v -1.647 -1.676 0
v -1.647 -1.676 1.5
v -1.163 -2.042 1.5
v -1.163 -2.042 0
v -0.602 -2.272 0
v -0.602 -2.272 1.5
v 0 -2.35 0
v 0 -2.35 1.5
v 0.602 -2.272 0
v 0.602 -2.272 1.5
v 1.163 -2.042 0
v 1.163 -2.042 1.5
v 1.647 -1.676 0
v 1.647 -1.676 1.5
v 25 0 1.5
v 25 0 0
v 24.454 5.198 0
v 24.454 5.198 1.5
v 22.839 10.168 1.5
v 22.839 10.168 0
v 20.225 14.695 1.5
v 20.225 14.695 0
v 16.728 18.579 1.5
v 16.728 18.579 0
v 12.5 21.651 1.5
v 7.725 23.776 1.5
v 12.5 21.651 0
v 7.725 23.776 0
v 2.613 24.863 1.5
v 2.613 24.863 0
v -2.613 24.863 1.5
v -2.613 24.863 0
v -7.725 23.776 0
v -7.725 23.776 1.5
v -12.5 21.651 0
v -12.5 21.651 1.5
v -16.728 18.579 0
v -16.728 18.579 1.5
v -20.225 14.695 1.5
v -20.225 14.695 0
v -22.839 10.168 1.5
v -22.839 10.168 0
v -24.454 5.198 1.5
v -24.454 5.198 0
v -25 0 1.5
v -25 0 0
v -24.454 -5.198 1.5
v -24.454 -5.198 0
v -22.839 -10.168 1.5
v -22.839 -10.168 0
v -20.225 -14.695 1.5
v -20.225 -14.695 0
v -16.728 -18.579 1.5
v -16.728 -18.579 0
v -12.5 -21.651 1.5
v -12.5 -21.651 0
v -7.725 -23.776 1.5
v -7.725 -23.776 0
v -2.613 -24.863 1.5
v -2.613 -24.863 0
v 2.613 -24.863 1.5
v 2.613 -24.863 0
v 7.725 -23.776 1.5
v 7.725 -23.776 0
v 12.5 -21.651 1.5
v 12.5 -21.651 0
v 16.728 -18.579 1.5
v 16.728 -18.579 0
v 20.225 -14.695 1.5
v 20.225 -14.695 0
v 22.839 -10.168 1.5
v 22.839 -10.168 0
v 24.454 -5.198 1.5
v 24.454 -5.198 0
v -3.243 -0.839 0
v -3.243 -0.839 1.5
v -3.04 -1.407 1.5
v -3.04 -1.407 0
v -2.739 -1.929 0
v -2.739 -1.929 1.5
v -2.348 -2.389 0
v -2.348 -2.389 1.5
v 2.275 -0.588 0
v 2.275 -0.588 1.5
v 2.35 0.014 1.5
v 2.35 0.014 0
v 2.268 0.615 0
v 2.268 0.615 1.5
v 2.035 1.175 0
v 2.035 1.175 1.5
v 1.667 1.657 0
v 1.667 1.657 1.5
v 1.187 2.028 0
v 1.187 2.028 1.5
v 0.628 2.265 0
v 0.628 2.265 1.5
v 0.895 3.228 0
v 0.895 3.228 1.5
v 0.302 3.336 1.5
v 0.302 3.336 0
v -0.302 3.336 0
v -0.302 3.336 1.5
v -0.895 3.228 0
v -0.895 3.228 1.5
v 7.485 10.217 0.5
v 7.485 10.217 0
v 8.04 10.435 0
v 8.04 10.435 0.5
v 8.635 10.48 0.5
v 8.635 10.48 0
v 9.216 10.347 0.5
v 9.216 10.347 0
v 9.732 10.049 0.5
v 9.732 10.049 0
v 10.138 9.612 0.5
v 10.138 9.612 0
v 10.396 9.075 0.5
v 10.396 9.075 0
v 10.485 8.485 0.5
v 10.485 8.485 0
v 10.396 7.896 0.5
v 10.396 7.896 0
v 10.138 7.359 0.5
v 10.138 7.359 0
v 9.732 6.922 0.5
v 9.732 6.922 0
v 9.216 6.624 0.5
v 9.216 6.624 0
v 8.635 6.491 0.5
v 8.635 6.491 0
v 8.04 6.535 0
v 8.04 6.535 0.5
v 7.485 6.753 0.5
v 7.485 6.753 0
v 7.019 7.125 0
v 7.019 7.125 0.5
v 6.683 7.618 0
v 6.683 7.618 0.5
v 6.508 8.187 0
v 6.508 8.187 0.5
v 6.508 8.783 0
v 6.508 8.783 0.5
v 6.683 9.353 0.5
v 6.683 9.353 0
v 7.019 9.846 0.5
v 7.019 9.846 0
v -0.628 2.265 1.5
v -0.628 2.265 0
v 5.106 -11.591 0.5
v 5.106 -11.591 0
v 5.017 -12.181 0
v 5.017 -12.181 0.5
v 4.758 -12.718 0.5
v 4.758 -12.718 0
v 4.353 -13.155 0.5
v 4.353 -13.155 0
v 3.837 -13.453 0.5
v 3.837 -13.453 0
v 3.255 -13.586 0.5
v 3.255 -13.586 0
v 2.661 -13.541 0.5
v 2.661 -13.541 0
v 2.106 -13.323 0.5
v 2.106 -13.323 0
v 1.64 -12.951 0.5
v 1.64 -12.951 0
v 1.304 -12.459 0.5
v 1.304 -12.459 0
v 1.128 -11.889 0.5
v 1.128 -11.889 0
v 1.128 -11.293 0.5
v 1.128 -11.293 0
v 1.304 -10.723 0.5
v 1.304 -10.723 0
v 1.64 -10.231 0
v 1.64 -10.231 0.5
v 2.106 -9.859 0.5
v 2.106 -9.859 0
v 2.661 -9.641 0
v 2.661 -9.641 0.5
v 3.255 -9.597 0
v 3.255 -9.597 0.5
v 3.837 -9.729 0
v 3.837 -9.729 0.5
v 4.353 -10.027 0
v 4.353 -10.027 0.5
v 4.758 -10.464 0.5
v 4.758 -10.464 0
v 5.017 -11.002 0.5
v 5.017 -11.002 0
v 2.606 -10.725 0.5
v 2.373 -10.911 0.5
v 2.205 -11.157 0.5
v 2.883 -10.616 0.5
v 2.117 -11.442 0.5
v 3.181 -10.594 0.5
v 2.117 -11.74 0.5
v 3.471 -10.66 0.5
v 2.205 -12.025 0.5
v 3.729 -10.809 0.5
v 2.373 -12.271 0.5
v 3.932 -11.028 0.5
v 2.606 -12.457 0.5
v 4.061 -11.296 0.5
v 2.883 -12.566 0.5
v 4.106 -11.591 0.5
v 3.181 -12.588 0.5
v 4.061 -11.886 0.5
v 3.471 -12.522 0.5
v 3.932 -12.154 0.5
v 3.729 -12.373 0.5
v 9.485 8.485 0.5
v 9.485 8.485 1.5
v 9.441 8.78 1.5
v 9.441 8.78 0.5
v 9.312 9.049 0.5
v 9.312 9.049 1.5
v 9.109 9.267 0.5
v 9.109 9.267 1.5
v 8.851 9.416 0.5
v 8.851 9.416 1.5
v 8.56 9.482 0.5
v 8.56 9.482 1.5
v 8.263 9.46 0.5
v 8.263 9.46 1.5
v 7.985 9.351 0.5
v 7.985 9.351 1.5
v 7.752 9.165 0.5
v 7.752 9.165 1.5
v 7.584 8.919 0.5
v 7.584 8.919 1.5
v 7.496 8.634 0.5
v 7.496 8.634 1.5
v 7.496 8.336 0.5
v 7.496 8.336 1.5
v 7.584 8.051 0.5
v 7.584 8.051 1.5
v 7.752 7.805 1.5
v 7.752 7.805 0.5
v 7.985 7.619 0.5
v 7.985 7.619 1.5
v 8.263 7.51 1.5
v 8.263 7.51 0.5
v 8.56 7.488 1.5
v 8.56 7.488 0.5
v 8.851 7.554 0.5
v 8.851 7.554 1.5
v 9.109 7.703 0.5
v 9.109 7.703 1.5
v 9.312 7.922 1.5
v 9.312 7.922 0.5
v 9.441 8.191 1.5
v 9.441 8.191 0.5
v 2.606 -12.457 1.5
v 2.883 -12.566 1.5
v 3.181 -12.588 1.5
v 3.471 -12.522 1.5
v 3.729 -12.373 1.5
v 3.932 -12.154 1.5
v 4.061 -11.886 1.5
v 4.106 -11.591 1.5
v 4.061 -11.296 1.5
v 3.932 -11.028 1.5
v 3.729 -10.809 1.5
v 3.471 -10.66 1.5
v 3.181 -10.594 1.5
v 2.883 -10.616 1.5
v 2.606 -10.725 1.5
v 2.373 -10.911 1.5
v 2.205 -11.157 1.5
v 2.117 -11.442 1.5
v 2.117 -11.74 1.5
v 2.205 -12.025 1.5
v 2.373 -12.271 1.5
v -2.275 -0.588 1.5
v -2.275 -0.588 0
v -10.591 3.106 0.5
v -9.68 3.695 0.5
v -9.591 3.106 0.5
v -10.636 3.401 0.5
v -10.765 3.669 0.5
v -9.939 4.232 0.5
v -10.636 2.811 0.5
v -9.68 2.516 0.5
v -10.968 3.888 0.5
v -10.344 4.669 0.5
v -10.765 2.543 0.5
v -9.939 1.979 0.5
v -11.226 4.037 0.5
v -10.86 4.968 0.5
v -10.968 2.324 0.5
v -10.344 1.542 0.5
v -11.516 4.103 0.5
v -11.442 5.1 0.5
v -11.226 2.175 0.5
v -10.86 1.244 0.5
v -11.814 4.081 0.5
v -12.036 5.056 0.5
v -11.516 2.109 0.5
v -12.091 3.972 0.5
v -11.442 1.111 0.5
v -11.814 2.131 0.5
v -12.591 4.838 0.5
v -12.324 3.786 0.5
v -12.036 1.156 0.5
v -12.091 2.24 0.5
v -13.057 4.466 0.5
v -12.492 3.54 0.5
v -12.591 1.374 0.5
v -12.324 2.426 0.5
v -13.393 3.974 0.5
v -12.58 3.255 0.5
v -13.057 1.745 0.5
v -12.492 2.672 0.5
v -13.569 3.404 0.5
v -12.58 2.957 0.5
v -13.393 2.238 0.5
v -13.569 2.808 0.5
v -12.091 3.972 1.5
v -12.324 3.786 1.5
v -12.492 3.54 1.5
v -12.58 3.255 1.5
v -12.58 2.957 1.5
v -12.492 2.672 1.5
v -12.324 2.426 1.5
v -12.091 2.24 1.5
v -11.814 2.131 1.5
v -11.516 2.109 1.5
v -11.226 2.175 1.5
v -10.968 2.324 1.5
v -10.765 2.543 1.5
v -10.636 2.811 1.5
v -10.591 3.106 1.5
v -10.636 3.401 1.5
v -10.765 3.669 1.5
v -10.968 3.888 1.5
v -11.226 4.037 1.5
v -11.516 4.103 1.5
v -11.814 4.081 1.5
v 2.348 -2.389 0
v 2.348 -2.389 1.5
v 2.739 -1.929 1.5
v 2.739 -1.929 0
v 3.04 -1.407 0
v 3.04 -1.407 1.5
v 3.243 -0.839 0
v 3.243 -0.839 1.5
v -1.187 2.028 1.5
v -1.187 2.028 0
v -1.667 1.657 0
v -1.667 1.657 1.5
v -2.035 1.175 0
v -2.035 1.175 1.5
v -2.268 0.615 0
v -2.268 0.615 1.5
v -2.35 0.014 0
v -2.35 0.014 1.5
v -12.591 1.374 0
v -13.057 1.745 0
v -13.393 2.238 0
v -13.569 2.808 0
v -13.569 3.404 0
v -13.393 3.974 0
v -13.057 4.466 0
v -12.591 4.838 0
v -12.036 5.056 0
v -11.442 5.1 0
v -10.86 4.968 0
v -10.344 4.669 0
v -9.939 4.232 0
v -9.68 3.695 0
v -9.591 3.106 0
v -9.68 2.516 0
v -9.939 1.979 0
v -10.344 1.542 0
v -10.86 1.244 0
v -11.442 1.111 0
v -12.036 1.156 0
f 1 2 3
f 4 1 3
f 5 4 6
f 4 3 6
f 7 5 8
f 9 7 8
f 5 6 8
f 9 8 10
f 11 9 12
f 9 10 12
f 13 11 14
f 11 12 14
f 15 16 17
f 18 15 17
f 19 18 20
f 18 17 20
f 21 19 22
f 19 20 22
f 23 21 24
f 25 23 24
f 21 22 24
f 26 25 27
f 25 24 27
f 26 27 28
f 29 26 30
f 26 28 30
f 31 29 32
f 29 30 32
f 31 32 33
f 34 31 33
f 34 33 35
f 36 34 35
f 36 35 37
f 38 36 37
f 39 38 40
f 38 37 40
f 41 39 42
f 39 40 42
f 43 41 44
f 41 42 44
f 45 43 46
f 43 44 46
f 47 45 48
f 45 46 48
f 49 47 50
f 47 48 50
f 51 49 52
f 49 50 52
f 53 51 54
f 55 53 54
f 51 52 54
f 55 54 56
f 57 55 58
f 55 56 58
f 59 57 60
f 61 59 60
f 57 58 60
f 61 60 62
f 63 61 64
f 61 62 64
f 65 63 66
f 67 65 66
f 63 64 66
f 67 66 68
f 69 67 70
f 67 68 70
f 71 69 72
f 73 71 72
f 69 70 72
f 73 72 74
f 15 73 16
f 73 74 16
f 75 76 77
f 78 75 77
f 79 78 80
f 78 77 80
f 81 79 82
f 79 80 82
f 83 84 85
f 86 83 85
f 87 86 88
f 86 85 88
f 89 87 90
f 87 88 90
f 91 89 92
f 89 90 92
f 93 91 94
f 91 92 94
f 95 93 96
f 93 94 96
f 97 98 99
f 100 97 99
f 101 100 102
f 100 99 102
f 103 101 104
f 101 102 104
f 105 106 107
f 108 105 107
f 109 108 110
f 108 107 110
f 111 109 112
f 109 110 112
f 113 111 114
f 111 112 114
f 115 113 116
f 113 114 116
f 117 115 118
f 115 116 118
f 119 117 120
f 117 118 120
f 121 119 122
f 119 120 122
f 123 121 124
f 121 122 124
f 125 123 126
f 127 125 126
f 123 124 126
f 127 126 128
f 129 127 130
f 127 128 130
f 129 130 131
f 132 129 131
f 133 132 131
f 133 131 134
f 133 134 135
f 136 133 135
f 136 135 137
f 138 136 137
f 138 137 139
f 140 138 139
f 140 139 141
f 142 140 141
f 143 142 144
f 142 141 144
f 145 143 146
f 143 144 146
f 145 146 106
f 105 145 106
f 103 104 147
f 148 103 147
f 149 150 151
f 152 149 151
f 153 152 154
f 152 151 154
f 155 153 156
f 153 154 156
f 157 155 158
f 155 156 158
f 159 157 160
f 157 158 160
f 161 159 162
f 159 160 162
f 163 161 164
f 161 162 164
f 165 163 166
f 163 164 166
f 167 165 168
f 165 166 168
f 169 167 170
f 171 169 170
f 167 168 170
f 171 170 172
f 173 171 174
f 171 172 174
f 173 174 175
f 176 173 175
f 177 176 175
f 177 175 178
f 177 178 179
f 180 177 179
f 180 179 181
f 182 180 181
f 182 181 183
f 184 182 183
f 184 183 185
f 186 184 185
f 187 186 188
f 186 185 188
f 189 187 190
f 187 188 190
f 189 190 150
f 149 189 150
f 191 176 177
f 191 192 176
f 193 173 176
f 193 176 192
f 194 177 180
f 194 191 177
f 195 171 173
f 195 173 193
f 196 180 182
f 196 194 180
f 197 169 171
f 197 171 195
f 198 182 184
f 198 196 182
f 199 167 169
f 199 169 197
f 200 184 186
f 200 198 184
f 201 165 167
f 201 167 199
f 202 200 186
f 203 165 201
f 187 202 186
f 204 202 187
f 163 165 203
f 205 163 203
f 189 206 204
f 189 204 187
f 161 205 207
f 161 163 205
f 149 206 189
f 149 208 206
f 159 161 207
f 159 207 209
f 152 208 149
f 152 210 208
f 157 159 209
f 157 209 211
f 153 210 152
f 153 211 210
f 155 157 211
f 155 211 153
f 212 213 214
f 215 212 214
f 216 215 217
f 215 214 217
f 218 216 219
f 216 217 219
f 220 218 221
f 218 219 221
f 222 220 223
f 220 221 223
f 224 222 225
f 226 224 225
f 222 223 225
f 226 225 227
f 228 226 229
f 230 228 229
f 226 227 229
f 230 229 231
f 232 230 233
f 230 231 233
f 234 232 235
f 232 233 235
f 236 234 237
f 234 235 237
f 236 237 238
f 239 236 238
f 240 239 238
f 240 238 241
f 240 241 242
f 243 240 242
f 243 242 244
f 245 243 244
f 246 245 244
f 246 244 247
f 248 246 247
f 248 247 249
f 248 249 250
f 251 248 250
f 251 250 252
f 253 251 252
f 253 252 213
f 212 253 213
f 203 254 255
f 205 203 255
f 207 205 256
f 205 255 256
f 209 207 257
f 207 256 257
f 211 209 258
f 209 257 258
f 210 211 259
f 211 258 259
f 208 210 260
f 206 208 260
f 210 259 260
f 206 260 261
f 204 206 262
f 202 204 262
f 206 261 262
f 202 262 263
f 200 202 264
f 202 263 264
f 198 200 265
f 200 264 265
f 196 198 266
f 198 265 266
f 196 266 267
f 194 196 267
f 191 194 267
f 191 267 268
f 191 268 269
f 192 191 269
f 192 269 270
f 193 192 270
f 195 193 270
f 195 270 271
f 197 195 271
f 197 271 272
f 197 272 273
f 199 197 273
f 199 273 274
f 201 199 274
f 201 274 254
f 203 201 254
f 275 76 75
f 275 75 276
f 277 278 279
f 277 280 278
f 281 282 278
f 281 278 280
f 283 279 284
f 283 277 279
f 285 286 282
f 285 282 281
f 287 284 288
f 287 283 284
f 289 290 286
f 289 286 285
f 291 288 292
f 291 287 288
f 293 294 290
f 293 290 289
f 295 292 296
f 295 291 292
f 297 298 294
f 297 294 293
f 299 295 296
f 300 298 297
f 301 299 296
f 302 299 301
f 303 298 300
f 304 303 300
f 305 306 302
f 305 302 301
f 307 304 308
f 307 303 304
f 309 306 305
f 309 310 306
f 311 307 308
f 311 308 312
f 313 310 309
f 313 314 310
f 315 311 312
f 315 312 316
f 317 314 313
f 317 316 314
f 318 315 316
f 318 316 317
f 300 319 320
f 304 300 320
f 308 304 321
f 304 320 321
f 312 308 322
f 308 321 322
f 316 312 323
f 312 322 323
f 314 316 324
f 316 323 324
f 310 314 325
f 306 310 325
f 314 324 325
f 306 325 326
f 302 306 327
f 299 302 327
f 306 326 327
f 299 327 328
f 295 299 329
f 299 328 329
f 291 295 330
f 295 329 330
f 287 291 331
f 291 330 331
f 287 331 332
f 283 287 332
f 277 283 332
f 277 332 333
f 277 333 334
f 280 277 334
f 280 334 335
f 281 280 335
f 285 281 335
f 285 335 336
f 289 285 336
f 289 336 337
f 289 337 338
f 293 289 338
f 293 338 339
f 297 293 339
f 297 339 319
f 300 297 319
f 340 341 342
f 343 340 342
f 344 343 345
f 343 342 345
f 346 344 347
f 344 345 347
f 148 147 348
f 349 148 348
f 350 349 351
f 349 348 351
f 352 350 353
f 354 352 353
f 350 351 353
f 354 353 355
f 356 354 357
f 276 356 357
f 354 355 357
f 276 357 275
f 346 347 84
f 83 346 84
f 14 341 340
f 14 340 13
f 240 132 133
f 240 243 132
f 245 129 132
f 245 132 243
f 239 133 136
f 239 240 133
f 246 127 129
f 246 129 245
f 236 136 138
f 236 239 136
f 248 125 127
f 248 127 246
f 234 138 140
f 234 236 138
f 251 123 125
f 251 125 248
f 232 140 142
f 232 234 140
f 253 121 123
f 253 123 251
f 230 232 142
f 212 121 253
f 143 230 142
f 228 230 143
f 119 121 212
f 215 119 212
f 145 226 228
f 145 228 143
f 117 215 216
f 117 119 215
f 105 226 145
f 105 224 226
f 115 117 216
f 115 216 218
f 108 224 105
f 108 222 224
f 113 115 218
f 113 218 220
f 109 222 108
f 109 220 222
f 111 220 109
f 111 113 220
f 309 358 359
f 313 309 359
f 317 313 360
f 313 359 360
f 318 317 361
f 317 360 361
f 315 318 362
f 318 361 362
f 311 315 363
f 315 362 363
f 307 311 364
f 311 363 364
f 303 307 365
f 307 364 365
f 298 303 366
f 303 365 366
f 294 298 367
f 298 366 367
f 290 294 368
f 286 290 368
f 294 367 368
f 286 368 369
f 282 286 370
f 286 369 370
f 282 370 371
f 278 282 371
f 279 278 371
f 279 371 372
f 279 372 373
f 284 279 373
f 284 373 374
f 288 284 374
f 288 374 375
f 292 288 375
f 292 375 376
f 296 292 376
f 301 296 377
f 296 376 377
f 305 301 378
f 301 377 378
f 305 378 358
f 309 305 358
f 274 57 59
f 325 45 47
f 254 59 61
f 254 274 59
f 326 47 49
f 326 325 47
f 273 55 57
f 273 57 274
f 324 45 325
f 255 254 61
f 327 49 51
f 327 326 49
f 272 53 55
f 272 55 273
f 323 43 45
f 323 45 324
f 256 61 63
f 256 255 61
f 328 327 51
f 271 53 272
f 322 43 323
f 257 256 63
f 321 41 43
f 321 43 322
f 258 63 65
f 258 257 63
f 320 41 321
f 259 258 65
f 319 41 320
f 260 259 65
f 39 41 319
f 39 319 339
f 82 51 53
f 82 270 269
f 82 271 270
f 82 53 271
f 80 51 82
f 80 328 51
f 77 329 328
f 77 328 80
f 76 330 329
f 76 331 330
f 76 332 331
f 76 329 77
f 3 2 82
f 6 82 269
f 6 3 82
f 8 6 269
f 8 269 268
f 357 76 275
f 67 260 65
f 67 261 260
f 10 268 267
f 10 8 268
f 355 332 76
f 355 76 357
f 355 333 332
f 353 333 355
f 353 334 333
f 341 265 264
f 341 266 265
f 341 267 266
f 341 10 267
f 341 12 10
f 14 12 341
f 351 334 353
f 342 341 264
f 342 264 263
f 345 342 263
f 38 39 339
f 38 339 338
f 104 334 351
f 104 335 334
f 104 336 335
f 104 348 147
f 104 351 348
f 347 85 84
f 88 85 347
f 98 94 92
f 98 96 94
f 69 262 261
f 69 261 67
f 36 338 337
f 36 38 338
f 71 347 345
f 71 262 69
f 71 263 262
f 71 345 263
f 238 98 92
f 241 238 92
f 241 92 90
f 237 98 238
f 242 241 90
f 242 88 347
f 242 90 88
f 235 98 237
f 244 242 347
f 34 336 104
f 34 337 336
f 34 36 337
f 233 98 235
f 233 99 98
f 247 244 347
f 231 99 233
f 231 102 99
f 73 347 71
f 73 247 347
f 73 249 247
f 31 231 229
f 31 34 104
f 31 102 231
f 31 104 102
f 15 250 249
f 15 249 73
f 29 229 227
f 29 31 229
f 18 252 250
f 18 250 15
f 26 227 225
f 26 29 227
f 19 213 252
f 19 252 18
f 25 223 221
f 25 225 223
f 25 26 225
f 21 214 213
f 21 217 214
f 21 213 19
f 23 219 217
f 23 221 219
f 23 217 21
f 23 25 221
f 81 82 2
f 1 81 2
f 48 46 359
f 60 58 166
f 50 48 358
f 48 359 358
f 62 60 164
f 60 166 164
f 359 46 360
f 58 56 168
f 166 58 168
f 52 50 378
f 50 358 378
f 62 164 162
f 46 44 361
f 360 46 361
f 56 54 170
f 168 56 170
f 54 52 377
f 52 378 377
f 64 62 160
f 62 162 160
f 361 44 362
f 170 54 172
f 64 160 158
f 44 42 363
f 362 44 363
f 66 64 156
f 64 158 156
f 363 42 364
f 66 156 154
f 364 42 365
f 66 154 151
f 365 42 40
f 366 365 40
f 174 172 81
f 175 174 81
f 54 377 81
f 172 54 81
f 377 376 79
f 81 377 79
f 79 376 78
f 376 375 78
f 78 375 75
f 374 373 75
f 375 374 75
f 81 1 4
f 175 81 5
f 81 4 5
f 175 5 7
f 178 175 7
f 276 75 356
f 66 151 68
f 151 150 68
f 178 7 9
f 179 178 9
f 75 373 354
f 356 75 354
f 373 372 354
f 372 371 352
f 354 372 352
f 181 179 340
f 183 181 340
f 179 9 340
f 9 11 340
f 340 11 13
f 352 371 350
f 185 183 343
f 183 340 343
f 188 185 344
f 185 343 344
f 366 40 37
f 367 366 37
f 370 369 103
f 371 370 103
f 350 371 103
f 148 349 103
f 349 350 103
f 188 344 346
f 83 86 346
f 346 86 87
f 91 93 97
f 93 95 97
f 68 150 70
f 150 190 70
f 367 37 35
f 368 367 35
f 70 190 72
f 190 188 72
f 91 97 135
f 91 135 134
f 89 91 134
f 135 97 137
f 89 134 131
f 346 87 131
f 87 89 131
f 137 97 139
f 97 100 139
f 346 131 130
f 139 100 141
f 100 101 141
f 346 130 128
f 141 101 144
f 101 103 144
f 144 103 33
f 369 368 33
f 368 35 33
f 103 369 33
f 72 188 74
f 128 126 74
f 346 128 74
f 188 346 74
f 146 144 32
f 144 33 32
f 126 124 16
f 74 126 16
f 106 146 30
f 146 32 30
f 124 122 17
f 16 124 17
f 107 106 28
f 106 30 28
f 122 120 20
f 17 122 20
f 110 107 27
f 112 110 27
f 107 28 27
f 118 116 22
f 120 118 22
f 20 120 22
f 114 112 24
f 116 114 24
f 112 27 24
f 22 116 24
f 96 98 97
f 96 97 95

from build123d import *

# Parameters (mm, degrees)
SKETCH_R              = 25
PAD_DEPTH             = 1.5
POCKET_DEPTH          = 1.5
POLARPATTERN_COUNT    = 3
SKETCH002_R           = 1
POCKET001_DEPTH       = 5
POLARPATTERN001_COUNT = 3
SKETCH003_R           = 2
POCKET002_DEPTH       = 0.5
POLARPATTERN002_COUNT = 3


with BuildPart() as part:
    # Sketch → Pad (new body)
    with BuildSketch(Plane.XY):
        Circle(SKETCH_R)
    extrude(amount=PAD_DEPTH)

    # Sketch001 (on Face3 of Pad) → Pocket (cut)
    with BuildSketch(Plane.XY.offset(1.5)):
        with BuildLine():
            ThreePointArc((-0.62801, 2.264532), (0, -2.35), (0.62801, 2.264532))
            Line((0.895249, 3.228162), (0.62801, 2.264532))
            ThreePointArc((0.895249, 3.228162), (0, 3.35), (-0.895249, 3.228162))
            Line((-0.895249, 3.228162), (-0.62801, 2.264532))
        make_face()
    pocket = extrude(amount=-POCKET_DEPTH, mode=Mode.SUBTRACT)

    # PolarPattern: Pocket ×3 about axis
    polarpattern_axis = Axis((0, 0, 1.5), (0, 0, 1))
    for i in range(1, POLARPATTERN_COUNT):
        add(pocket.rotate(polarpattern_axis, i * 360 / POLARPATTERN_COUNT), mode=Mode.SUBTRACT)

    # Sketch002 (on Face3 of PolarPattern) → Pocket001 (cut)
    with BuildSketch(Plane.XY.offset(1.5)):
        with Locations((8.485281, 8.485281)):
            Circle(SKETCH002_R)
    pocket001 = extrude(amount=-POCKET001_DEPTH, mode=Mode.SUBTRACT)

    # PolarPattern001: Pocket001 ×3 about axis
    polarpattern001_axis = Axis((0, 0, 1.5), (0, 0, 1))
    for i in range(1, POLARPATTERN001_COUNT):
        add(pocket001.rotate(polarpattern001_axis, i * 360 / POLARPATTERN001_COUNT), mode=Mode.SUBTRACT)

    # Sketch003 (on Face2 of PolarPattern001) → Pocket002 (cut)
    with BuildSketch(Plane(origin=(0, 0, 0), x_dir=(1, 0, 0), z_dir=(0, 0, -1))):
        with Locations((3.105829, 11.59111)):
            Circle(SKETCH003_R)
    pocket002 = extrude(amount=-POCKET002_DEPTH, mode=Mode.SUBTRACT)

    # PolarPattern002: Pocket002 ×3 about axis
    polarpattern002_axis = Axis((0, 0, 0), (0, 0, -1))
    for i in range(1, POLARPATTERN002_COUNT):
        add(pocket002.rotate(polarpattern002_axis, i * 360 / POLARPATTERN002_COUNT), mode=Mode.SUBTRACT)


solid = part.part
